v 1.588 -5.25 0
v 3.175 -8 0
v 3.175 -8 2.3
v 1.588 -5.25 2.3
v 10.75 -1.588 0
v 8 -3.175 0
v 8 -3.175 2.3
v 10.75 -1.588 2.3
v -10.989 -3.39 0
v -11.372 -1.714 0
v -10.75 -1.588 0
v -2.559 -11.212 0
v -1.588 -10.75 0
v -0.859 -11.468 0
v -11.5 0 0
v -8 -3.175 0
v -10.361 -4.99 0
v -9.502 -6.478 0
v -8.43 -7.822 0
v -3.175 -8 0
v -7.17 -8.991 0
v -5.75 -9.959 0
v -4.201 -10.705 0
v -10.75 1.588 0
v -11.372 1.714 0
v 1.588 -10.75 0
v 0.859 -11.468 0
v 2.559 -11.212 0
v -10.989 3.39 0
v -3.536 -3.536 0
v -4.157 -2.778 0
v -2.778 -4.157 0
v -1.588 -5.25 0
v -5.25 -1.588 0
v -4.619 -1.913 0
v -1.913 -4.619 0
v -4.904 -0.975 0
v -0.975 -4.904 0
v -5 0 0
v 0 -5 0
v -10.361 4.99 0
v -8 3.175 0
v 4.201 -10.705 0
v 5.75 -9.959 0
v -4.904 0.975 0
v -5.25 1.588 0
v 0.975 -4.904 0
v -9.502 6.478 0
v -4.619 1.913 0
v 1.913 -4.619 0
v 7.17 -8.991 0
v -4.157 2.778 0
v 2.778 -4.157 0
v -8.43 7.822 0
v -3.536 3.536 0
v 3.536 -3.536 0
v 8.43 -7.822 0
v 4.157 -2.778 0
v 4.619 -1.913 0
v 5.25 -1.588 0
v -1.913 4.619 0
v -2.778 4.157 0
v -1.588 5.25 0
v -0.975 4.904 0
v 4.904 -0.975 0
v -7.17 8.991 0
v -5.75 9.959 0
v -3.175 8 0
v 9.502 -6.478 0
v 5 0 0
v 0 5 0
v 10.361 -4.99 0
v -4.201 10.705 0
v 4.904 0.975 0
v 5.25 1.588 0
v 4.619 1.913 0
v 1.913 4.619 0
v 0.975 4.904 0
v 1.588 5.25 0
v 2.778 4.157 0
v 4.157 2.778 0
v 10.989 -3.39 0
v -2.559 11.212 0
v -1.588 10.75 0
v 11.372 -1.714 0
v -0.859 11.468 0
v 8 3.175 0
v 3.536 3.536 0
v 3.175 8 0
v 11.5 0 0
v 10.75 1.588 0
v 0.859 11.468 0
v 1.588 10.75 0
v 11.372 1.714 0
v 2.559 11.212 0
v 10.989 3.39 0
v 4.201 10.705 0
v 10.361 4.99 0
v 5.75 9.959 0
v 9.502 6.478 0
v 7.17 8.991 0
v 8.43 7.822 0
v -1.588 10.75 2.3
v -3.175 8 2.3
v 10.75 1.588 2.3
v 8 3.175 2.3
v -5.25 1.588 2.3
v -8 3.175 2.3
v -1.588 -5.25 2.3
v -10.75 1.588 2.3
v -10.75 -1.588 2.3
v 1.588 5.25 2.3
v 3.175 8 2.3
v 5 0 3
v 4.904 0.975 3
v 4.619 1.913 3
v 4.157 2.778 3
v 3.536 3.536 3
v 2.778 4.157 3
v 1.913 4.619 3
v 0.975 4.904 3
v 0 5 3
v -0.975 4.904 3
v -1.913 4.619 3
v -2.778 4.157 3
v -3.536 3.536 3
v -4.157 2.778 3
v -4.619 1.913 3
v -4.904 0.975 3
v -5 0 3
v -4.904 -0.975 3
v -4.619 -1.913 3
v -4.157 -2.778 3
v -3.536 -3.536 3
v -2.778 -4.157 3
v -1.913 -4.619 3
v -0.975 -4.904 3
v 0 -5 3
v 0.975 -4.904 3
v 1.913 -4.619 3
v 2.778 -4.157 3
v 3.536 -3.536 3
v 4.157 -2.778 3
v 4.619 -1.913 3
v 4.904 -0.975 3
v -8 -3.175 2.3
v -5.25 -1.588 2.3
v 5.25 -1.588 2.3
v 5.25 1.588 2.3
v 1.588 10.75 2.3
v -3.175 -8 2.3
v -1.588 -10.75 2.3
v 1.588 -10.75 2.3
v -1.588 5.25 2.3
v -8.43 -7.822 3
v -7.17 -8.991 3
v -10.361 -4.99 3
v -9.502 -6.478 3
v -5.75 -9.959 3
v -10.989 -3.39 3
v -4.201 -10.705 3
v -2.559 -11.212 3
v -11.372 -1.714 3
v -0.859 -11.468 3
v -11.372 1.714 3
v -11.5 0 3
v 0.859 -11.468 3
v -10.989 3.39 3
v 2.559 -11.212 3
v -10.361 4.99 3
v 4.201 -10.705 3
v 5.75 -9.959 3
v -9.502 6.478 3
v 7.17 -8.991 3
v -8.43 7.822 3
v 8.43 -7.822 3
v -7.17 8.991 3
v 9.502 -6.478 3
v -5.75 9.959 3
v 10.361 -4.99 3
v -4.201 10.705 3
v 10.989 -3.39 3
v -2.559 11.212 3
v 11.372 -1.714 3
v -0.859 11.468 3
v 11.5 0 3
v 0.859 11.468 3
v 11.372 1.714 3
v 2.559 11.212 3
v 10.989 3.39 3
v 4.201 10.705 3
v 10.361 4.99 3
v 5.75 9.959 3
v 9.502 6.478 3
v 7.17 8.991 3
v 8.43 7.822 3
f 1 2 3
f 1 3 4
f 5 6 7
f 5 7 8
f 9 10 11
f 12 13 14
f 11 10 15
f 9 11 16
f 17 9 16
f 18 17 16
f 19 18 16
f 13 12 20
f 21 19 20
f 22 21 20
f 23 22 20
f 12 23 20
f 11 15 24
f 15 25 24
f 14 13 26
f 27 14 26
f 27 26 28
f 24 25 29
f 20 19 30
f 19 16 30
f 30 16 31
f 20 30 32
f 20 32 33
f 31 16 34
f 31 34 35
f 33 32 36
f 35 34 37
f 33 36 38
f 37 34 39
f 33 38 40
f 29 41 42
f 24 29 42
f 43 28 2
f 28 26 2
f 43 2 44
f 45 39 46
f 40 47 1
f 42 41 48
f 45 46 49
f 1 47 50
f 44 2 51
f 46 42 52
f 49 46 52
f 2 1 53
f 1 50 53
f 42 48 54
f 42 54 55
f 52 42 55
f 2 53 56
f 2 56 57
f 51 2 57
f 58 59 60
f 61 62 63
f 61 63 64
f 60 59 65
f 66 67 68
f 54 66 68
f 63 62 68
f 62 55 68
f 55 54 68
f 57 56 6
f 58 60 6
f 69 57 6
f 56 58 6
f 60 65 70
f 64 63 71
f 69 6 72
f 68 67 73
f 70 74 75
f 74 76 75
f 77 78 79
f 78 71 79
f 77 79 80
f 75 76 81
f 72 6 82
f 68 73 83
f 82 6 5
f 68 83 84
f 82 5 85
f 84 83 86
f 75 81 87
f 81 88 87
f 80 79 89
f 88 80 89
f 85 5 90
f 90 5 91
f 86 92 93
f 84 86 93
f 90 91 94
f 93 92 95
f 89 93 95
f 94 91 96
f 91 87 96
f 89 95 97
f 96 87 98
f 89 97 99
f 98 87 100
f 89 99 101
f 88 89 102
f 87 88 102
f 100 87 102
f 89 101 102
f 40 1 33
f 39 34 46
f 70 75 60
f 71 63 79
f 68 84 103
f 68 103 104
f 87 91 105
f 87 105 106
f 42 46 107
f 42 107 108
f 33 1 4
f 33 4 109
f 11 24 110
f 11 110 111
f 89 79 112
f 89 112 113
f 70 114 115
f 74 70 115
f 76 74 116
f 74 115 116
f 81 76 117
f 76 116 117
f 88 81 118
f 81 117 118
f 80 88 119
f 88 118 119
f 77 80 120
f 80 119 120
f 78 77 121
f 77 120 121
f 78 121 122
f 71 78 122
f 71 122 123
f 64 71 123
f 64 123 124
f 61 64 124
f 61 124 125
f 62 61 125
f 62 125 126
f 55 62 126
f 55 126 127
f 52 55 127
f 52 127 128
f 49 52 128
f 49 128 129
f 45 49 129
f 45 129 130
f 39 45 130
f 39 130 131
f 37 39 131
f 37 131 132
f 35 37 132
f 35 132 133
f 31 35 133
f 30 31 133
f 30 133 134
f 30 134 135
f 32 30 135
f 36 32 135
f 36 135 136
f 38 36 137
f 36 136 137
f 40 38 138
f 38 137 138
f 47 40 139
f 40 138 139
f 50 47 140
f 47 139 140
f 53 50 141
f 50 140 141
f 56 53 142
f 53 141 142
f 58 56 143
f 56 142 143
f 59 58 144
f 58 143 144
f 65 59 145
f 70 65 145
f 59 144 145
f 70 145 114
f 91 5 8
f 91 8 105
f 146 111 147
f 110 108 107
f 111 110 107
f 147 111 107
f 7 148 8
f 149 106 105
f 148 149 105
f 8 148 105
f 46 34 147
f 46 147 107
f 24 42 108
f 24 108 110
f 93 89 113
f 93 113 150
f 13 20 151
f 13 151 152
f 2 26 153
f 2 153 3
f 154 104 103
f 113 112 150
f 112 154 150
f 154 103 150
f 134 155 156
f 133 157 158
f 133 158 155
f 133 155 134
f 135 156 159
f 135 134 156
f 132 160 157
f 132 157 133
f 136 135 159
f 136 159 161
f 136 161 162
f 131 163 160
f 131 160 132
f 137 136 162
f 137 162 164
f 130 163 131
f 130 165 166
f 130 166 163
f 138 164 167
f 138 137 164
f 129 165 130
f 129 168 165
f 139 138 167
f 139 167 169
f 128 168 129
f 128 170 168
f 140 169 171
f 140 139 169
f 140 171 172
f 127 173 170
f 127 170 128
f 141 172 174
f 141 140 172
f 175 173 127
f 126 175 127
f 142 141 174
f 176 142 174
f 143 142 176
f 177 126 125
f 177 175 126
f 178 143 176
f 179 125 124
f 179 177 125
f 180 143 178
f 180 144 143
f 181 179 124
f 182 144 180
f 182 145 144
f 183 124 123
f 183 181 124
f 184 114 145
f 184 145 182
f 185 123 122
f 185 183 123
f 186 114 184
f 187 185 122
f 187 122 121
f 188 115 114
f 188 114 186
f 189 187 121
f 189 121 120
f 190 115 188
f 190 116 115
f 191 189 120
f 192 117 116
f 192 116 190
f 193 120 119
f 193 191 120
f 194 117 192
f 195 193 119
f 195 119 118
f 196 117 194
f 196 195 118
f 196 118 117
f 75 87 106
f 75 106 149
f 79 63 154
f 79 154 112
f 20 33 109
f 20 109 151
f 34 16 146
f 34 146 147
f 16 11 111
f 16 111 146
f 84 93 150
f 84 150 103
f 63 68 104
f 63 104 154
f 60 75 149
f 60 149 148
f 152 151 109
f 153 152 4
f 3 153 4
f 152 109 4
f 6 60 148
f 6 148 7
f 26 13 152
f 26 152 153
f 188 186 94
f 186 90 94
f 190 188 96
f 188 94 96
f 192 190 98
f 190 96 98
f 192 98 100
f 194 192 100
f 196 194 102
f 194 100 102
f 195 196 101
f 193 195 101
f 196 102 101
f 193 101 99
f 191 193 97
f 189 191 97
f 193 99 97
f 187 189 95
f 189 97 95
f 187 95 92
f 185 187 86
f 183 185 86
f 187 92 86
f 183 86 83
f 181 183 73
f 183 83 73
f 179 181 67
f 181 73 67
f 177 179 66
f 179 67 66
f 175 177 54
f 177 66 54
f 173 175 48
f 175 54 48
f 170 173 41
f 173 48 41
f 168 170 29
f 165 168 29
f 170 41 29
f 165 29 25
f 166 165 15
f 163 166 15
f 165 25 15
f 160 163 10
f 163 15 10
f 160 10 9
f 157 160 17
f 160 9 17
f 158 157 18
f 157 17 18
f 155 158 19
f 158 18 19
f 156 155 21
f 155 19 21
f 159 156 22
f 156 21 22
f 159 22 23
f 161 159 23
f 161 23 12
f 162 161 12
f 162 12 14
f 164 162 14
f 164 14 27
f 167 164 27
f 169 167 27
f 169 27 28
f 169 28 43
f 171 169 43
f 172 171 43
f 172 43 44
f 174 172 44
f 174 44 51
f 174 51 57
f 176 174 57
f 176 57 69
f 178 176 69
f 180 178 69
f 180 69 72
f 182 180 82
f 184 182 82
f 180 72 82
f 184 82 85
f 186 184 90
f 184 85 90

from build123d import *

# Parameters (mm, degrees)
SKETCH_1_R          = 11.5
EXTRUDE_1_DEPTH     = 2.3
SKETCH_2_R          = 11.5
EXTRUDE_2_DEPTH     = 0.7
SKETCH_3_R          = 5
CUT_EXTRUDE_1_DEPTH = 10


with BuildPart() as part:
    # 草图1 → 凸台-拉伸1 (new body)
    with BuildSketch(Plane.XY):
        Circle(SKETCH_1_R)
        Polygon((8, -3.175426481), (10.75, -1.58771324), (10.75, 1.58771324), (8, 3.175426481), (5.25, 1.58771324), (5.25, -1.58771324), align=None, mode=Mode.SUBTRACT)
        Polygon((3.175426481, 8), (1.58771324, 10.75), (-1.58771324, 10.75), (-3.175426481, 8), (-1.58771324, 5.25), (1.58771324, 5.25), align=None, mode=Mode.SUBTRACT)
        Polygon((-3.175426481, -8), (-1.58771324, -10.75), (1.58771324, -10.75), (3.175426481, -8), (1.58771324, -5.25), (-1.58771324, -5.25), align=None, mode=Mode.SUBTRACT)
        Polygon((-8, 3.175426481), (-10.75, 1.58771324), (-10.75, -1.58771324), (-8, -3.175426481), (-5.25, -1.58771324), (-5.25, 1.58771324), align=None, mode=Mode.SUBTRACT)
    extrude(amount=EXTRUDE_1_DEPTH)

    # 草图2 → 凸台-拉伸2 (add)
    with BuildSketch(Plane.XY.offset(2.3)):
        Circle(SKETCH_2_R)
    extrude(amount=EXTRUDE_2_DEPTH)

    # 草图3 → 切除-拉伸1 (cut)
    with BuildSketch(Plane.XY.offset(3)):
        Circle(SKETCH_3_R)
    extrude(amount=-CUT_EXTRUDE_1_DEPTH, mode=Mode.SUBTRACT)


solid = part.part
